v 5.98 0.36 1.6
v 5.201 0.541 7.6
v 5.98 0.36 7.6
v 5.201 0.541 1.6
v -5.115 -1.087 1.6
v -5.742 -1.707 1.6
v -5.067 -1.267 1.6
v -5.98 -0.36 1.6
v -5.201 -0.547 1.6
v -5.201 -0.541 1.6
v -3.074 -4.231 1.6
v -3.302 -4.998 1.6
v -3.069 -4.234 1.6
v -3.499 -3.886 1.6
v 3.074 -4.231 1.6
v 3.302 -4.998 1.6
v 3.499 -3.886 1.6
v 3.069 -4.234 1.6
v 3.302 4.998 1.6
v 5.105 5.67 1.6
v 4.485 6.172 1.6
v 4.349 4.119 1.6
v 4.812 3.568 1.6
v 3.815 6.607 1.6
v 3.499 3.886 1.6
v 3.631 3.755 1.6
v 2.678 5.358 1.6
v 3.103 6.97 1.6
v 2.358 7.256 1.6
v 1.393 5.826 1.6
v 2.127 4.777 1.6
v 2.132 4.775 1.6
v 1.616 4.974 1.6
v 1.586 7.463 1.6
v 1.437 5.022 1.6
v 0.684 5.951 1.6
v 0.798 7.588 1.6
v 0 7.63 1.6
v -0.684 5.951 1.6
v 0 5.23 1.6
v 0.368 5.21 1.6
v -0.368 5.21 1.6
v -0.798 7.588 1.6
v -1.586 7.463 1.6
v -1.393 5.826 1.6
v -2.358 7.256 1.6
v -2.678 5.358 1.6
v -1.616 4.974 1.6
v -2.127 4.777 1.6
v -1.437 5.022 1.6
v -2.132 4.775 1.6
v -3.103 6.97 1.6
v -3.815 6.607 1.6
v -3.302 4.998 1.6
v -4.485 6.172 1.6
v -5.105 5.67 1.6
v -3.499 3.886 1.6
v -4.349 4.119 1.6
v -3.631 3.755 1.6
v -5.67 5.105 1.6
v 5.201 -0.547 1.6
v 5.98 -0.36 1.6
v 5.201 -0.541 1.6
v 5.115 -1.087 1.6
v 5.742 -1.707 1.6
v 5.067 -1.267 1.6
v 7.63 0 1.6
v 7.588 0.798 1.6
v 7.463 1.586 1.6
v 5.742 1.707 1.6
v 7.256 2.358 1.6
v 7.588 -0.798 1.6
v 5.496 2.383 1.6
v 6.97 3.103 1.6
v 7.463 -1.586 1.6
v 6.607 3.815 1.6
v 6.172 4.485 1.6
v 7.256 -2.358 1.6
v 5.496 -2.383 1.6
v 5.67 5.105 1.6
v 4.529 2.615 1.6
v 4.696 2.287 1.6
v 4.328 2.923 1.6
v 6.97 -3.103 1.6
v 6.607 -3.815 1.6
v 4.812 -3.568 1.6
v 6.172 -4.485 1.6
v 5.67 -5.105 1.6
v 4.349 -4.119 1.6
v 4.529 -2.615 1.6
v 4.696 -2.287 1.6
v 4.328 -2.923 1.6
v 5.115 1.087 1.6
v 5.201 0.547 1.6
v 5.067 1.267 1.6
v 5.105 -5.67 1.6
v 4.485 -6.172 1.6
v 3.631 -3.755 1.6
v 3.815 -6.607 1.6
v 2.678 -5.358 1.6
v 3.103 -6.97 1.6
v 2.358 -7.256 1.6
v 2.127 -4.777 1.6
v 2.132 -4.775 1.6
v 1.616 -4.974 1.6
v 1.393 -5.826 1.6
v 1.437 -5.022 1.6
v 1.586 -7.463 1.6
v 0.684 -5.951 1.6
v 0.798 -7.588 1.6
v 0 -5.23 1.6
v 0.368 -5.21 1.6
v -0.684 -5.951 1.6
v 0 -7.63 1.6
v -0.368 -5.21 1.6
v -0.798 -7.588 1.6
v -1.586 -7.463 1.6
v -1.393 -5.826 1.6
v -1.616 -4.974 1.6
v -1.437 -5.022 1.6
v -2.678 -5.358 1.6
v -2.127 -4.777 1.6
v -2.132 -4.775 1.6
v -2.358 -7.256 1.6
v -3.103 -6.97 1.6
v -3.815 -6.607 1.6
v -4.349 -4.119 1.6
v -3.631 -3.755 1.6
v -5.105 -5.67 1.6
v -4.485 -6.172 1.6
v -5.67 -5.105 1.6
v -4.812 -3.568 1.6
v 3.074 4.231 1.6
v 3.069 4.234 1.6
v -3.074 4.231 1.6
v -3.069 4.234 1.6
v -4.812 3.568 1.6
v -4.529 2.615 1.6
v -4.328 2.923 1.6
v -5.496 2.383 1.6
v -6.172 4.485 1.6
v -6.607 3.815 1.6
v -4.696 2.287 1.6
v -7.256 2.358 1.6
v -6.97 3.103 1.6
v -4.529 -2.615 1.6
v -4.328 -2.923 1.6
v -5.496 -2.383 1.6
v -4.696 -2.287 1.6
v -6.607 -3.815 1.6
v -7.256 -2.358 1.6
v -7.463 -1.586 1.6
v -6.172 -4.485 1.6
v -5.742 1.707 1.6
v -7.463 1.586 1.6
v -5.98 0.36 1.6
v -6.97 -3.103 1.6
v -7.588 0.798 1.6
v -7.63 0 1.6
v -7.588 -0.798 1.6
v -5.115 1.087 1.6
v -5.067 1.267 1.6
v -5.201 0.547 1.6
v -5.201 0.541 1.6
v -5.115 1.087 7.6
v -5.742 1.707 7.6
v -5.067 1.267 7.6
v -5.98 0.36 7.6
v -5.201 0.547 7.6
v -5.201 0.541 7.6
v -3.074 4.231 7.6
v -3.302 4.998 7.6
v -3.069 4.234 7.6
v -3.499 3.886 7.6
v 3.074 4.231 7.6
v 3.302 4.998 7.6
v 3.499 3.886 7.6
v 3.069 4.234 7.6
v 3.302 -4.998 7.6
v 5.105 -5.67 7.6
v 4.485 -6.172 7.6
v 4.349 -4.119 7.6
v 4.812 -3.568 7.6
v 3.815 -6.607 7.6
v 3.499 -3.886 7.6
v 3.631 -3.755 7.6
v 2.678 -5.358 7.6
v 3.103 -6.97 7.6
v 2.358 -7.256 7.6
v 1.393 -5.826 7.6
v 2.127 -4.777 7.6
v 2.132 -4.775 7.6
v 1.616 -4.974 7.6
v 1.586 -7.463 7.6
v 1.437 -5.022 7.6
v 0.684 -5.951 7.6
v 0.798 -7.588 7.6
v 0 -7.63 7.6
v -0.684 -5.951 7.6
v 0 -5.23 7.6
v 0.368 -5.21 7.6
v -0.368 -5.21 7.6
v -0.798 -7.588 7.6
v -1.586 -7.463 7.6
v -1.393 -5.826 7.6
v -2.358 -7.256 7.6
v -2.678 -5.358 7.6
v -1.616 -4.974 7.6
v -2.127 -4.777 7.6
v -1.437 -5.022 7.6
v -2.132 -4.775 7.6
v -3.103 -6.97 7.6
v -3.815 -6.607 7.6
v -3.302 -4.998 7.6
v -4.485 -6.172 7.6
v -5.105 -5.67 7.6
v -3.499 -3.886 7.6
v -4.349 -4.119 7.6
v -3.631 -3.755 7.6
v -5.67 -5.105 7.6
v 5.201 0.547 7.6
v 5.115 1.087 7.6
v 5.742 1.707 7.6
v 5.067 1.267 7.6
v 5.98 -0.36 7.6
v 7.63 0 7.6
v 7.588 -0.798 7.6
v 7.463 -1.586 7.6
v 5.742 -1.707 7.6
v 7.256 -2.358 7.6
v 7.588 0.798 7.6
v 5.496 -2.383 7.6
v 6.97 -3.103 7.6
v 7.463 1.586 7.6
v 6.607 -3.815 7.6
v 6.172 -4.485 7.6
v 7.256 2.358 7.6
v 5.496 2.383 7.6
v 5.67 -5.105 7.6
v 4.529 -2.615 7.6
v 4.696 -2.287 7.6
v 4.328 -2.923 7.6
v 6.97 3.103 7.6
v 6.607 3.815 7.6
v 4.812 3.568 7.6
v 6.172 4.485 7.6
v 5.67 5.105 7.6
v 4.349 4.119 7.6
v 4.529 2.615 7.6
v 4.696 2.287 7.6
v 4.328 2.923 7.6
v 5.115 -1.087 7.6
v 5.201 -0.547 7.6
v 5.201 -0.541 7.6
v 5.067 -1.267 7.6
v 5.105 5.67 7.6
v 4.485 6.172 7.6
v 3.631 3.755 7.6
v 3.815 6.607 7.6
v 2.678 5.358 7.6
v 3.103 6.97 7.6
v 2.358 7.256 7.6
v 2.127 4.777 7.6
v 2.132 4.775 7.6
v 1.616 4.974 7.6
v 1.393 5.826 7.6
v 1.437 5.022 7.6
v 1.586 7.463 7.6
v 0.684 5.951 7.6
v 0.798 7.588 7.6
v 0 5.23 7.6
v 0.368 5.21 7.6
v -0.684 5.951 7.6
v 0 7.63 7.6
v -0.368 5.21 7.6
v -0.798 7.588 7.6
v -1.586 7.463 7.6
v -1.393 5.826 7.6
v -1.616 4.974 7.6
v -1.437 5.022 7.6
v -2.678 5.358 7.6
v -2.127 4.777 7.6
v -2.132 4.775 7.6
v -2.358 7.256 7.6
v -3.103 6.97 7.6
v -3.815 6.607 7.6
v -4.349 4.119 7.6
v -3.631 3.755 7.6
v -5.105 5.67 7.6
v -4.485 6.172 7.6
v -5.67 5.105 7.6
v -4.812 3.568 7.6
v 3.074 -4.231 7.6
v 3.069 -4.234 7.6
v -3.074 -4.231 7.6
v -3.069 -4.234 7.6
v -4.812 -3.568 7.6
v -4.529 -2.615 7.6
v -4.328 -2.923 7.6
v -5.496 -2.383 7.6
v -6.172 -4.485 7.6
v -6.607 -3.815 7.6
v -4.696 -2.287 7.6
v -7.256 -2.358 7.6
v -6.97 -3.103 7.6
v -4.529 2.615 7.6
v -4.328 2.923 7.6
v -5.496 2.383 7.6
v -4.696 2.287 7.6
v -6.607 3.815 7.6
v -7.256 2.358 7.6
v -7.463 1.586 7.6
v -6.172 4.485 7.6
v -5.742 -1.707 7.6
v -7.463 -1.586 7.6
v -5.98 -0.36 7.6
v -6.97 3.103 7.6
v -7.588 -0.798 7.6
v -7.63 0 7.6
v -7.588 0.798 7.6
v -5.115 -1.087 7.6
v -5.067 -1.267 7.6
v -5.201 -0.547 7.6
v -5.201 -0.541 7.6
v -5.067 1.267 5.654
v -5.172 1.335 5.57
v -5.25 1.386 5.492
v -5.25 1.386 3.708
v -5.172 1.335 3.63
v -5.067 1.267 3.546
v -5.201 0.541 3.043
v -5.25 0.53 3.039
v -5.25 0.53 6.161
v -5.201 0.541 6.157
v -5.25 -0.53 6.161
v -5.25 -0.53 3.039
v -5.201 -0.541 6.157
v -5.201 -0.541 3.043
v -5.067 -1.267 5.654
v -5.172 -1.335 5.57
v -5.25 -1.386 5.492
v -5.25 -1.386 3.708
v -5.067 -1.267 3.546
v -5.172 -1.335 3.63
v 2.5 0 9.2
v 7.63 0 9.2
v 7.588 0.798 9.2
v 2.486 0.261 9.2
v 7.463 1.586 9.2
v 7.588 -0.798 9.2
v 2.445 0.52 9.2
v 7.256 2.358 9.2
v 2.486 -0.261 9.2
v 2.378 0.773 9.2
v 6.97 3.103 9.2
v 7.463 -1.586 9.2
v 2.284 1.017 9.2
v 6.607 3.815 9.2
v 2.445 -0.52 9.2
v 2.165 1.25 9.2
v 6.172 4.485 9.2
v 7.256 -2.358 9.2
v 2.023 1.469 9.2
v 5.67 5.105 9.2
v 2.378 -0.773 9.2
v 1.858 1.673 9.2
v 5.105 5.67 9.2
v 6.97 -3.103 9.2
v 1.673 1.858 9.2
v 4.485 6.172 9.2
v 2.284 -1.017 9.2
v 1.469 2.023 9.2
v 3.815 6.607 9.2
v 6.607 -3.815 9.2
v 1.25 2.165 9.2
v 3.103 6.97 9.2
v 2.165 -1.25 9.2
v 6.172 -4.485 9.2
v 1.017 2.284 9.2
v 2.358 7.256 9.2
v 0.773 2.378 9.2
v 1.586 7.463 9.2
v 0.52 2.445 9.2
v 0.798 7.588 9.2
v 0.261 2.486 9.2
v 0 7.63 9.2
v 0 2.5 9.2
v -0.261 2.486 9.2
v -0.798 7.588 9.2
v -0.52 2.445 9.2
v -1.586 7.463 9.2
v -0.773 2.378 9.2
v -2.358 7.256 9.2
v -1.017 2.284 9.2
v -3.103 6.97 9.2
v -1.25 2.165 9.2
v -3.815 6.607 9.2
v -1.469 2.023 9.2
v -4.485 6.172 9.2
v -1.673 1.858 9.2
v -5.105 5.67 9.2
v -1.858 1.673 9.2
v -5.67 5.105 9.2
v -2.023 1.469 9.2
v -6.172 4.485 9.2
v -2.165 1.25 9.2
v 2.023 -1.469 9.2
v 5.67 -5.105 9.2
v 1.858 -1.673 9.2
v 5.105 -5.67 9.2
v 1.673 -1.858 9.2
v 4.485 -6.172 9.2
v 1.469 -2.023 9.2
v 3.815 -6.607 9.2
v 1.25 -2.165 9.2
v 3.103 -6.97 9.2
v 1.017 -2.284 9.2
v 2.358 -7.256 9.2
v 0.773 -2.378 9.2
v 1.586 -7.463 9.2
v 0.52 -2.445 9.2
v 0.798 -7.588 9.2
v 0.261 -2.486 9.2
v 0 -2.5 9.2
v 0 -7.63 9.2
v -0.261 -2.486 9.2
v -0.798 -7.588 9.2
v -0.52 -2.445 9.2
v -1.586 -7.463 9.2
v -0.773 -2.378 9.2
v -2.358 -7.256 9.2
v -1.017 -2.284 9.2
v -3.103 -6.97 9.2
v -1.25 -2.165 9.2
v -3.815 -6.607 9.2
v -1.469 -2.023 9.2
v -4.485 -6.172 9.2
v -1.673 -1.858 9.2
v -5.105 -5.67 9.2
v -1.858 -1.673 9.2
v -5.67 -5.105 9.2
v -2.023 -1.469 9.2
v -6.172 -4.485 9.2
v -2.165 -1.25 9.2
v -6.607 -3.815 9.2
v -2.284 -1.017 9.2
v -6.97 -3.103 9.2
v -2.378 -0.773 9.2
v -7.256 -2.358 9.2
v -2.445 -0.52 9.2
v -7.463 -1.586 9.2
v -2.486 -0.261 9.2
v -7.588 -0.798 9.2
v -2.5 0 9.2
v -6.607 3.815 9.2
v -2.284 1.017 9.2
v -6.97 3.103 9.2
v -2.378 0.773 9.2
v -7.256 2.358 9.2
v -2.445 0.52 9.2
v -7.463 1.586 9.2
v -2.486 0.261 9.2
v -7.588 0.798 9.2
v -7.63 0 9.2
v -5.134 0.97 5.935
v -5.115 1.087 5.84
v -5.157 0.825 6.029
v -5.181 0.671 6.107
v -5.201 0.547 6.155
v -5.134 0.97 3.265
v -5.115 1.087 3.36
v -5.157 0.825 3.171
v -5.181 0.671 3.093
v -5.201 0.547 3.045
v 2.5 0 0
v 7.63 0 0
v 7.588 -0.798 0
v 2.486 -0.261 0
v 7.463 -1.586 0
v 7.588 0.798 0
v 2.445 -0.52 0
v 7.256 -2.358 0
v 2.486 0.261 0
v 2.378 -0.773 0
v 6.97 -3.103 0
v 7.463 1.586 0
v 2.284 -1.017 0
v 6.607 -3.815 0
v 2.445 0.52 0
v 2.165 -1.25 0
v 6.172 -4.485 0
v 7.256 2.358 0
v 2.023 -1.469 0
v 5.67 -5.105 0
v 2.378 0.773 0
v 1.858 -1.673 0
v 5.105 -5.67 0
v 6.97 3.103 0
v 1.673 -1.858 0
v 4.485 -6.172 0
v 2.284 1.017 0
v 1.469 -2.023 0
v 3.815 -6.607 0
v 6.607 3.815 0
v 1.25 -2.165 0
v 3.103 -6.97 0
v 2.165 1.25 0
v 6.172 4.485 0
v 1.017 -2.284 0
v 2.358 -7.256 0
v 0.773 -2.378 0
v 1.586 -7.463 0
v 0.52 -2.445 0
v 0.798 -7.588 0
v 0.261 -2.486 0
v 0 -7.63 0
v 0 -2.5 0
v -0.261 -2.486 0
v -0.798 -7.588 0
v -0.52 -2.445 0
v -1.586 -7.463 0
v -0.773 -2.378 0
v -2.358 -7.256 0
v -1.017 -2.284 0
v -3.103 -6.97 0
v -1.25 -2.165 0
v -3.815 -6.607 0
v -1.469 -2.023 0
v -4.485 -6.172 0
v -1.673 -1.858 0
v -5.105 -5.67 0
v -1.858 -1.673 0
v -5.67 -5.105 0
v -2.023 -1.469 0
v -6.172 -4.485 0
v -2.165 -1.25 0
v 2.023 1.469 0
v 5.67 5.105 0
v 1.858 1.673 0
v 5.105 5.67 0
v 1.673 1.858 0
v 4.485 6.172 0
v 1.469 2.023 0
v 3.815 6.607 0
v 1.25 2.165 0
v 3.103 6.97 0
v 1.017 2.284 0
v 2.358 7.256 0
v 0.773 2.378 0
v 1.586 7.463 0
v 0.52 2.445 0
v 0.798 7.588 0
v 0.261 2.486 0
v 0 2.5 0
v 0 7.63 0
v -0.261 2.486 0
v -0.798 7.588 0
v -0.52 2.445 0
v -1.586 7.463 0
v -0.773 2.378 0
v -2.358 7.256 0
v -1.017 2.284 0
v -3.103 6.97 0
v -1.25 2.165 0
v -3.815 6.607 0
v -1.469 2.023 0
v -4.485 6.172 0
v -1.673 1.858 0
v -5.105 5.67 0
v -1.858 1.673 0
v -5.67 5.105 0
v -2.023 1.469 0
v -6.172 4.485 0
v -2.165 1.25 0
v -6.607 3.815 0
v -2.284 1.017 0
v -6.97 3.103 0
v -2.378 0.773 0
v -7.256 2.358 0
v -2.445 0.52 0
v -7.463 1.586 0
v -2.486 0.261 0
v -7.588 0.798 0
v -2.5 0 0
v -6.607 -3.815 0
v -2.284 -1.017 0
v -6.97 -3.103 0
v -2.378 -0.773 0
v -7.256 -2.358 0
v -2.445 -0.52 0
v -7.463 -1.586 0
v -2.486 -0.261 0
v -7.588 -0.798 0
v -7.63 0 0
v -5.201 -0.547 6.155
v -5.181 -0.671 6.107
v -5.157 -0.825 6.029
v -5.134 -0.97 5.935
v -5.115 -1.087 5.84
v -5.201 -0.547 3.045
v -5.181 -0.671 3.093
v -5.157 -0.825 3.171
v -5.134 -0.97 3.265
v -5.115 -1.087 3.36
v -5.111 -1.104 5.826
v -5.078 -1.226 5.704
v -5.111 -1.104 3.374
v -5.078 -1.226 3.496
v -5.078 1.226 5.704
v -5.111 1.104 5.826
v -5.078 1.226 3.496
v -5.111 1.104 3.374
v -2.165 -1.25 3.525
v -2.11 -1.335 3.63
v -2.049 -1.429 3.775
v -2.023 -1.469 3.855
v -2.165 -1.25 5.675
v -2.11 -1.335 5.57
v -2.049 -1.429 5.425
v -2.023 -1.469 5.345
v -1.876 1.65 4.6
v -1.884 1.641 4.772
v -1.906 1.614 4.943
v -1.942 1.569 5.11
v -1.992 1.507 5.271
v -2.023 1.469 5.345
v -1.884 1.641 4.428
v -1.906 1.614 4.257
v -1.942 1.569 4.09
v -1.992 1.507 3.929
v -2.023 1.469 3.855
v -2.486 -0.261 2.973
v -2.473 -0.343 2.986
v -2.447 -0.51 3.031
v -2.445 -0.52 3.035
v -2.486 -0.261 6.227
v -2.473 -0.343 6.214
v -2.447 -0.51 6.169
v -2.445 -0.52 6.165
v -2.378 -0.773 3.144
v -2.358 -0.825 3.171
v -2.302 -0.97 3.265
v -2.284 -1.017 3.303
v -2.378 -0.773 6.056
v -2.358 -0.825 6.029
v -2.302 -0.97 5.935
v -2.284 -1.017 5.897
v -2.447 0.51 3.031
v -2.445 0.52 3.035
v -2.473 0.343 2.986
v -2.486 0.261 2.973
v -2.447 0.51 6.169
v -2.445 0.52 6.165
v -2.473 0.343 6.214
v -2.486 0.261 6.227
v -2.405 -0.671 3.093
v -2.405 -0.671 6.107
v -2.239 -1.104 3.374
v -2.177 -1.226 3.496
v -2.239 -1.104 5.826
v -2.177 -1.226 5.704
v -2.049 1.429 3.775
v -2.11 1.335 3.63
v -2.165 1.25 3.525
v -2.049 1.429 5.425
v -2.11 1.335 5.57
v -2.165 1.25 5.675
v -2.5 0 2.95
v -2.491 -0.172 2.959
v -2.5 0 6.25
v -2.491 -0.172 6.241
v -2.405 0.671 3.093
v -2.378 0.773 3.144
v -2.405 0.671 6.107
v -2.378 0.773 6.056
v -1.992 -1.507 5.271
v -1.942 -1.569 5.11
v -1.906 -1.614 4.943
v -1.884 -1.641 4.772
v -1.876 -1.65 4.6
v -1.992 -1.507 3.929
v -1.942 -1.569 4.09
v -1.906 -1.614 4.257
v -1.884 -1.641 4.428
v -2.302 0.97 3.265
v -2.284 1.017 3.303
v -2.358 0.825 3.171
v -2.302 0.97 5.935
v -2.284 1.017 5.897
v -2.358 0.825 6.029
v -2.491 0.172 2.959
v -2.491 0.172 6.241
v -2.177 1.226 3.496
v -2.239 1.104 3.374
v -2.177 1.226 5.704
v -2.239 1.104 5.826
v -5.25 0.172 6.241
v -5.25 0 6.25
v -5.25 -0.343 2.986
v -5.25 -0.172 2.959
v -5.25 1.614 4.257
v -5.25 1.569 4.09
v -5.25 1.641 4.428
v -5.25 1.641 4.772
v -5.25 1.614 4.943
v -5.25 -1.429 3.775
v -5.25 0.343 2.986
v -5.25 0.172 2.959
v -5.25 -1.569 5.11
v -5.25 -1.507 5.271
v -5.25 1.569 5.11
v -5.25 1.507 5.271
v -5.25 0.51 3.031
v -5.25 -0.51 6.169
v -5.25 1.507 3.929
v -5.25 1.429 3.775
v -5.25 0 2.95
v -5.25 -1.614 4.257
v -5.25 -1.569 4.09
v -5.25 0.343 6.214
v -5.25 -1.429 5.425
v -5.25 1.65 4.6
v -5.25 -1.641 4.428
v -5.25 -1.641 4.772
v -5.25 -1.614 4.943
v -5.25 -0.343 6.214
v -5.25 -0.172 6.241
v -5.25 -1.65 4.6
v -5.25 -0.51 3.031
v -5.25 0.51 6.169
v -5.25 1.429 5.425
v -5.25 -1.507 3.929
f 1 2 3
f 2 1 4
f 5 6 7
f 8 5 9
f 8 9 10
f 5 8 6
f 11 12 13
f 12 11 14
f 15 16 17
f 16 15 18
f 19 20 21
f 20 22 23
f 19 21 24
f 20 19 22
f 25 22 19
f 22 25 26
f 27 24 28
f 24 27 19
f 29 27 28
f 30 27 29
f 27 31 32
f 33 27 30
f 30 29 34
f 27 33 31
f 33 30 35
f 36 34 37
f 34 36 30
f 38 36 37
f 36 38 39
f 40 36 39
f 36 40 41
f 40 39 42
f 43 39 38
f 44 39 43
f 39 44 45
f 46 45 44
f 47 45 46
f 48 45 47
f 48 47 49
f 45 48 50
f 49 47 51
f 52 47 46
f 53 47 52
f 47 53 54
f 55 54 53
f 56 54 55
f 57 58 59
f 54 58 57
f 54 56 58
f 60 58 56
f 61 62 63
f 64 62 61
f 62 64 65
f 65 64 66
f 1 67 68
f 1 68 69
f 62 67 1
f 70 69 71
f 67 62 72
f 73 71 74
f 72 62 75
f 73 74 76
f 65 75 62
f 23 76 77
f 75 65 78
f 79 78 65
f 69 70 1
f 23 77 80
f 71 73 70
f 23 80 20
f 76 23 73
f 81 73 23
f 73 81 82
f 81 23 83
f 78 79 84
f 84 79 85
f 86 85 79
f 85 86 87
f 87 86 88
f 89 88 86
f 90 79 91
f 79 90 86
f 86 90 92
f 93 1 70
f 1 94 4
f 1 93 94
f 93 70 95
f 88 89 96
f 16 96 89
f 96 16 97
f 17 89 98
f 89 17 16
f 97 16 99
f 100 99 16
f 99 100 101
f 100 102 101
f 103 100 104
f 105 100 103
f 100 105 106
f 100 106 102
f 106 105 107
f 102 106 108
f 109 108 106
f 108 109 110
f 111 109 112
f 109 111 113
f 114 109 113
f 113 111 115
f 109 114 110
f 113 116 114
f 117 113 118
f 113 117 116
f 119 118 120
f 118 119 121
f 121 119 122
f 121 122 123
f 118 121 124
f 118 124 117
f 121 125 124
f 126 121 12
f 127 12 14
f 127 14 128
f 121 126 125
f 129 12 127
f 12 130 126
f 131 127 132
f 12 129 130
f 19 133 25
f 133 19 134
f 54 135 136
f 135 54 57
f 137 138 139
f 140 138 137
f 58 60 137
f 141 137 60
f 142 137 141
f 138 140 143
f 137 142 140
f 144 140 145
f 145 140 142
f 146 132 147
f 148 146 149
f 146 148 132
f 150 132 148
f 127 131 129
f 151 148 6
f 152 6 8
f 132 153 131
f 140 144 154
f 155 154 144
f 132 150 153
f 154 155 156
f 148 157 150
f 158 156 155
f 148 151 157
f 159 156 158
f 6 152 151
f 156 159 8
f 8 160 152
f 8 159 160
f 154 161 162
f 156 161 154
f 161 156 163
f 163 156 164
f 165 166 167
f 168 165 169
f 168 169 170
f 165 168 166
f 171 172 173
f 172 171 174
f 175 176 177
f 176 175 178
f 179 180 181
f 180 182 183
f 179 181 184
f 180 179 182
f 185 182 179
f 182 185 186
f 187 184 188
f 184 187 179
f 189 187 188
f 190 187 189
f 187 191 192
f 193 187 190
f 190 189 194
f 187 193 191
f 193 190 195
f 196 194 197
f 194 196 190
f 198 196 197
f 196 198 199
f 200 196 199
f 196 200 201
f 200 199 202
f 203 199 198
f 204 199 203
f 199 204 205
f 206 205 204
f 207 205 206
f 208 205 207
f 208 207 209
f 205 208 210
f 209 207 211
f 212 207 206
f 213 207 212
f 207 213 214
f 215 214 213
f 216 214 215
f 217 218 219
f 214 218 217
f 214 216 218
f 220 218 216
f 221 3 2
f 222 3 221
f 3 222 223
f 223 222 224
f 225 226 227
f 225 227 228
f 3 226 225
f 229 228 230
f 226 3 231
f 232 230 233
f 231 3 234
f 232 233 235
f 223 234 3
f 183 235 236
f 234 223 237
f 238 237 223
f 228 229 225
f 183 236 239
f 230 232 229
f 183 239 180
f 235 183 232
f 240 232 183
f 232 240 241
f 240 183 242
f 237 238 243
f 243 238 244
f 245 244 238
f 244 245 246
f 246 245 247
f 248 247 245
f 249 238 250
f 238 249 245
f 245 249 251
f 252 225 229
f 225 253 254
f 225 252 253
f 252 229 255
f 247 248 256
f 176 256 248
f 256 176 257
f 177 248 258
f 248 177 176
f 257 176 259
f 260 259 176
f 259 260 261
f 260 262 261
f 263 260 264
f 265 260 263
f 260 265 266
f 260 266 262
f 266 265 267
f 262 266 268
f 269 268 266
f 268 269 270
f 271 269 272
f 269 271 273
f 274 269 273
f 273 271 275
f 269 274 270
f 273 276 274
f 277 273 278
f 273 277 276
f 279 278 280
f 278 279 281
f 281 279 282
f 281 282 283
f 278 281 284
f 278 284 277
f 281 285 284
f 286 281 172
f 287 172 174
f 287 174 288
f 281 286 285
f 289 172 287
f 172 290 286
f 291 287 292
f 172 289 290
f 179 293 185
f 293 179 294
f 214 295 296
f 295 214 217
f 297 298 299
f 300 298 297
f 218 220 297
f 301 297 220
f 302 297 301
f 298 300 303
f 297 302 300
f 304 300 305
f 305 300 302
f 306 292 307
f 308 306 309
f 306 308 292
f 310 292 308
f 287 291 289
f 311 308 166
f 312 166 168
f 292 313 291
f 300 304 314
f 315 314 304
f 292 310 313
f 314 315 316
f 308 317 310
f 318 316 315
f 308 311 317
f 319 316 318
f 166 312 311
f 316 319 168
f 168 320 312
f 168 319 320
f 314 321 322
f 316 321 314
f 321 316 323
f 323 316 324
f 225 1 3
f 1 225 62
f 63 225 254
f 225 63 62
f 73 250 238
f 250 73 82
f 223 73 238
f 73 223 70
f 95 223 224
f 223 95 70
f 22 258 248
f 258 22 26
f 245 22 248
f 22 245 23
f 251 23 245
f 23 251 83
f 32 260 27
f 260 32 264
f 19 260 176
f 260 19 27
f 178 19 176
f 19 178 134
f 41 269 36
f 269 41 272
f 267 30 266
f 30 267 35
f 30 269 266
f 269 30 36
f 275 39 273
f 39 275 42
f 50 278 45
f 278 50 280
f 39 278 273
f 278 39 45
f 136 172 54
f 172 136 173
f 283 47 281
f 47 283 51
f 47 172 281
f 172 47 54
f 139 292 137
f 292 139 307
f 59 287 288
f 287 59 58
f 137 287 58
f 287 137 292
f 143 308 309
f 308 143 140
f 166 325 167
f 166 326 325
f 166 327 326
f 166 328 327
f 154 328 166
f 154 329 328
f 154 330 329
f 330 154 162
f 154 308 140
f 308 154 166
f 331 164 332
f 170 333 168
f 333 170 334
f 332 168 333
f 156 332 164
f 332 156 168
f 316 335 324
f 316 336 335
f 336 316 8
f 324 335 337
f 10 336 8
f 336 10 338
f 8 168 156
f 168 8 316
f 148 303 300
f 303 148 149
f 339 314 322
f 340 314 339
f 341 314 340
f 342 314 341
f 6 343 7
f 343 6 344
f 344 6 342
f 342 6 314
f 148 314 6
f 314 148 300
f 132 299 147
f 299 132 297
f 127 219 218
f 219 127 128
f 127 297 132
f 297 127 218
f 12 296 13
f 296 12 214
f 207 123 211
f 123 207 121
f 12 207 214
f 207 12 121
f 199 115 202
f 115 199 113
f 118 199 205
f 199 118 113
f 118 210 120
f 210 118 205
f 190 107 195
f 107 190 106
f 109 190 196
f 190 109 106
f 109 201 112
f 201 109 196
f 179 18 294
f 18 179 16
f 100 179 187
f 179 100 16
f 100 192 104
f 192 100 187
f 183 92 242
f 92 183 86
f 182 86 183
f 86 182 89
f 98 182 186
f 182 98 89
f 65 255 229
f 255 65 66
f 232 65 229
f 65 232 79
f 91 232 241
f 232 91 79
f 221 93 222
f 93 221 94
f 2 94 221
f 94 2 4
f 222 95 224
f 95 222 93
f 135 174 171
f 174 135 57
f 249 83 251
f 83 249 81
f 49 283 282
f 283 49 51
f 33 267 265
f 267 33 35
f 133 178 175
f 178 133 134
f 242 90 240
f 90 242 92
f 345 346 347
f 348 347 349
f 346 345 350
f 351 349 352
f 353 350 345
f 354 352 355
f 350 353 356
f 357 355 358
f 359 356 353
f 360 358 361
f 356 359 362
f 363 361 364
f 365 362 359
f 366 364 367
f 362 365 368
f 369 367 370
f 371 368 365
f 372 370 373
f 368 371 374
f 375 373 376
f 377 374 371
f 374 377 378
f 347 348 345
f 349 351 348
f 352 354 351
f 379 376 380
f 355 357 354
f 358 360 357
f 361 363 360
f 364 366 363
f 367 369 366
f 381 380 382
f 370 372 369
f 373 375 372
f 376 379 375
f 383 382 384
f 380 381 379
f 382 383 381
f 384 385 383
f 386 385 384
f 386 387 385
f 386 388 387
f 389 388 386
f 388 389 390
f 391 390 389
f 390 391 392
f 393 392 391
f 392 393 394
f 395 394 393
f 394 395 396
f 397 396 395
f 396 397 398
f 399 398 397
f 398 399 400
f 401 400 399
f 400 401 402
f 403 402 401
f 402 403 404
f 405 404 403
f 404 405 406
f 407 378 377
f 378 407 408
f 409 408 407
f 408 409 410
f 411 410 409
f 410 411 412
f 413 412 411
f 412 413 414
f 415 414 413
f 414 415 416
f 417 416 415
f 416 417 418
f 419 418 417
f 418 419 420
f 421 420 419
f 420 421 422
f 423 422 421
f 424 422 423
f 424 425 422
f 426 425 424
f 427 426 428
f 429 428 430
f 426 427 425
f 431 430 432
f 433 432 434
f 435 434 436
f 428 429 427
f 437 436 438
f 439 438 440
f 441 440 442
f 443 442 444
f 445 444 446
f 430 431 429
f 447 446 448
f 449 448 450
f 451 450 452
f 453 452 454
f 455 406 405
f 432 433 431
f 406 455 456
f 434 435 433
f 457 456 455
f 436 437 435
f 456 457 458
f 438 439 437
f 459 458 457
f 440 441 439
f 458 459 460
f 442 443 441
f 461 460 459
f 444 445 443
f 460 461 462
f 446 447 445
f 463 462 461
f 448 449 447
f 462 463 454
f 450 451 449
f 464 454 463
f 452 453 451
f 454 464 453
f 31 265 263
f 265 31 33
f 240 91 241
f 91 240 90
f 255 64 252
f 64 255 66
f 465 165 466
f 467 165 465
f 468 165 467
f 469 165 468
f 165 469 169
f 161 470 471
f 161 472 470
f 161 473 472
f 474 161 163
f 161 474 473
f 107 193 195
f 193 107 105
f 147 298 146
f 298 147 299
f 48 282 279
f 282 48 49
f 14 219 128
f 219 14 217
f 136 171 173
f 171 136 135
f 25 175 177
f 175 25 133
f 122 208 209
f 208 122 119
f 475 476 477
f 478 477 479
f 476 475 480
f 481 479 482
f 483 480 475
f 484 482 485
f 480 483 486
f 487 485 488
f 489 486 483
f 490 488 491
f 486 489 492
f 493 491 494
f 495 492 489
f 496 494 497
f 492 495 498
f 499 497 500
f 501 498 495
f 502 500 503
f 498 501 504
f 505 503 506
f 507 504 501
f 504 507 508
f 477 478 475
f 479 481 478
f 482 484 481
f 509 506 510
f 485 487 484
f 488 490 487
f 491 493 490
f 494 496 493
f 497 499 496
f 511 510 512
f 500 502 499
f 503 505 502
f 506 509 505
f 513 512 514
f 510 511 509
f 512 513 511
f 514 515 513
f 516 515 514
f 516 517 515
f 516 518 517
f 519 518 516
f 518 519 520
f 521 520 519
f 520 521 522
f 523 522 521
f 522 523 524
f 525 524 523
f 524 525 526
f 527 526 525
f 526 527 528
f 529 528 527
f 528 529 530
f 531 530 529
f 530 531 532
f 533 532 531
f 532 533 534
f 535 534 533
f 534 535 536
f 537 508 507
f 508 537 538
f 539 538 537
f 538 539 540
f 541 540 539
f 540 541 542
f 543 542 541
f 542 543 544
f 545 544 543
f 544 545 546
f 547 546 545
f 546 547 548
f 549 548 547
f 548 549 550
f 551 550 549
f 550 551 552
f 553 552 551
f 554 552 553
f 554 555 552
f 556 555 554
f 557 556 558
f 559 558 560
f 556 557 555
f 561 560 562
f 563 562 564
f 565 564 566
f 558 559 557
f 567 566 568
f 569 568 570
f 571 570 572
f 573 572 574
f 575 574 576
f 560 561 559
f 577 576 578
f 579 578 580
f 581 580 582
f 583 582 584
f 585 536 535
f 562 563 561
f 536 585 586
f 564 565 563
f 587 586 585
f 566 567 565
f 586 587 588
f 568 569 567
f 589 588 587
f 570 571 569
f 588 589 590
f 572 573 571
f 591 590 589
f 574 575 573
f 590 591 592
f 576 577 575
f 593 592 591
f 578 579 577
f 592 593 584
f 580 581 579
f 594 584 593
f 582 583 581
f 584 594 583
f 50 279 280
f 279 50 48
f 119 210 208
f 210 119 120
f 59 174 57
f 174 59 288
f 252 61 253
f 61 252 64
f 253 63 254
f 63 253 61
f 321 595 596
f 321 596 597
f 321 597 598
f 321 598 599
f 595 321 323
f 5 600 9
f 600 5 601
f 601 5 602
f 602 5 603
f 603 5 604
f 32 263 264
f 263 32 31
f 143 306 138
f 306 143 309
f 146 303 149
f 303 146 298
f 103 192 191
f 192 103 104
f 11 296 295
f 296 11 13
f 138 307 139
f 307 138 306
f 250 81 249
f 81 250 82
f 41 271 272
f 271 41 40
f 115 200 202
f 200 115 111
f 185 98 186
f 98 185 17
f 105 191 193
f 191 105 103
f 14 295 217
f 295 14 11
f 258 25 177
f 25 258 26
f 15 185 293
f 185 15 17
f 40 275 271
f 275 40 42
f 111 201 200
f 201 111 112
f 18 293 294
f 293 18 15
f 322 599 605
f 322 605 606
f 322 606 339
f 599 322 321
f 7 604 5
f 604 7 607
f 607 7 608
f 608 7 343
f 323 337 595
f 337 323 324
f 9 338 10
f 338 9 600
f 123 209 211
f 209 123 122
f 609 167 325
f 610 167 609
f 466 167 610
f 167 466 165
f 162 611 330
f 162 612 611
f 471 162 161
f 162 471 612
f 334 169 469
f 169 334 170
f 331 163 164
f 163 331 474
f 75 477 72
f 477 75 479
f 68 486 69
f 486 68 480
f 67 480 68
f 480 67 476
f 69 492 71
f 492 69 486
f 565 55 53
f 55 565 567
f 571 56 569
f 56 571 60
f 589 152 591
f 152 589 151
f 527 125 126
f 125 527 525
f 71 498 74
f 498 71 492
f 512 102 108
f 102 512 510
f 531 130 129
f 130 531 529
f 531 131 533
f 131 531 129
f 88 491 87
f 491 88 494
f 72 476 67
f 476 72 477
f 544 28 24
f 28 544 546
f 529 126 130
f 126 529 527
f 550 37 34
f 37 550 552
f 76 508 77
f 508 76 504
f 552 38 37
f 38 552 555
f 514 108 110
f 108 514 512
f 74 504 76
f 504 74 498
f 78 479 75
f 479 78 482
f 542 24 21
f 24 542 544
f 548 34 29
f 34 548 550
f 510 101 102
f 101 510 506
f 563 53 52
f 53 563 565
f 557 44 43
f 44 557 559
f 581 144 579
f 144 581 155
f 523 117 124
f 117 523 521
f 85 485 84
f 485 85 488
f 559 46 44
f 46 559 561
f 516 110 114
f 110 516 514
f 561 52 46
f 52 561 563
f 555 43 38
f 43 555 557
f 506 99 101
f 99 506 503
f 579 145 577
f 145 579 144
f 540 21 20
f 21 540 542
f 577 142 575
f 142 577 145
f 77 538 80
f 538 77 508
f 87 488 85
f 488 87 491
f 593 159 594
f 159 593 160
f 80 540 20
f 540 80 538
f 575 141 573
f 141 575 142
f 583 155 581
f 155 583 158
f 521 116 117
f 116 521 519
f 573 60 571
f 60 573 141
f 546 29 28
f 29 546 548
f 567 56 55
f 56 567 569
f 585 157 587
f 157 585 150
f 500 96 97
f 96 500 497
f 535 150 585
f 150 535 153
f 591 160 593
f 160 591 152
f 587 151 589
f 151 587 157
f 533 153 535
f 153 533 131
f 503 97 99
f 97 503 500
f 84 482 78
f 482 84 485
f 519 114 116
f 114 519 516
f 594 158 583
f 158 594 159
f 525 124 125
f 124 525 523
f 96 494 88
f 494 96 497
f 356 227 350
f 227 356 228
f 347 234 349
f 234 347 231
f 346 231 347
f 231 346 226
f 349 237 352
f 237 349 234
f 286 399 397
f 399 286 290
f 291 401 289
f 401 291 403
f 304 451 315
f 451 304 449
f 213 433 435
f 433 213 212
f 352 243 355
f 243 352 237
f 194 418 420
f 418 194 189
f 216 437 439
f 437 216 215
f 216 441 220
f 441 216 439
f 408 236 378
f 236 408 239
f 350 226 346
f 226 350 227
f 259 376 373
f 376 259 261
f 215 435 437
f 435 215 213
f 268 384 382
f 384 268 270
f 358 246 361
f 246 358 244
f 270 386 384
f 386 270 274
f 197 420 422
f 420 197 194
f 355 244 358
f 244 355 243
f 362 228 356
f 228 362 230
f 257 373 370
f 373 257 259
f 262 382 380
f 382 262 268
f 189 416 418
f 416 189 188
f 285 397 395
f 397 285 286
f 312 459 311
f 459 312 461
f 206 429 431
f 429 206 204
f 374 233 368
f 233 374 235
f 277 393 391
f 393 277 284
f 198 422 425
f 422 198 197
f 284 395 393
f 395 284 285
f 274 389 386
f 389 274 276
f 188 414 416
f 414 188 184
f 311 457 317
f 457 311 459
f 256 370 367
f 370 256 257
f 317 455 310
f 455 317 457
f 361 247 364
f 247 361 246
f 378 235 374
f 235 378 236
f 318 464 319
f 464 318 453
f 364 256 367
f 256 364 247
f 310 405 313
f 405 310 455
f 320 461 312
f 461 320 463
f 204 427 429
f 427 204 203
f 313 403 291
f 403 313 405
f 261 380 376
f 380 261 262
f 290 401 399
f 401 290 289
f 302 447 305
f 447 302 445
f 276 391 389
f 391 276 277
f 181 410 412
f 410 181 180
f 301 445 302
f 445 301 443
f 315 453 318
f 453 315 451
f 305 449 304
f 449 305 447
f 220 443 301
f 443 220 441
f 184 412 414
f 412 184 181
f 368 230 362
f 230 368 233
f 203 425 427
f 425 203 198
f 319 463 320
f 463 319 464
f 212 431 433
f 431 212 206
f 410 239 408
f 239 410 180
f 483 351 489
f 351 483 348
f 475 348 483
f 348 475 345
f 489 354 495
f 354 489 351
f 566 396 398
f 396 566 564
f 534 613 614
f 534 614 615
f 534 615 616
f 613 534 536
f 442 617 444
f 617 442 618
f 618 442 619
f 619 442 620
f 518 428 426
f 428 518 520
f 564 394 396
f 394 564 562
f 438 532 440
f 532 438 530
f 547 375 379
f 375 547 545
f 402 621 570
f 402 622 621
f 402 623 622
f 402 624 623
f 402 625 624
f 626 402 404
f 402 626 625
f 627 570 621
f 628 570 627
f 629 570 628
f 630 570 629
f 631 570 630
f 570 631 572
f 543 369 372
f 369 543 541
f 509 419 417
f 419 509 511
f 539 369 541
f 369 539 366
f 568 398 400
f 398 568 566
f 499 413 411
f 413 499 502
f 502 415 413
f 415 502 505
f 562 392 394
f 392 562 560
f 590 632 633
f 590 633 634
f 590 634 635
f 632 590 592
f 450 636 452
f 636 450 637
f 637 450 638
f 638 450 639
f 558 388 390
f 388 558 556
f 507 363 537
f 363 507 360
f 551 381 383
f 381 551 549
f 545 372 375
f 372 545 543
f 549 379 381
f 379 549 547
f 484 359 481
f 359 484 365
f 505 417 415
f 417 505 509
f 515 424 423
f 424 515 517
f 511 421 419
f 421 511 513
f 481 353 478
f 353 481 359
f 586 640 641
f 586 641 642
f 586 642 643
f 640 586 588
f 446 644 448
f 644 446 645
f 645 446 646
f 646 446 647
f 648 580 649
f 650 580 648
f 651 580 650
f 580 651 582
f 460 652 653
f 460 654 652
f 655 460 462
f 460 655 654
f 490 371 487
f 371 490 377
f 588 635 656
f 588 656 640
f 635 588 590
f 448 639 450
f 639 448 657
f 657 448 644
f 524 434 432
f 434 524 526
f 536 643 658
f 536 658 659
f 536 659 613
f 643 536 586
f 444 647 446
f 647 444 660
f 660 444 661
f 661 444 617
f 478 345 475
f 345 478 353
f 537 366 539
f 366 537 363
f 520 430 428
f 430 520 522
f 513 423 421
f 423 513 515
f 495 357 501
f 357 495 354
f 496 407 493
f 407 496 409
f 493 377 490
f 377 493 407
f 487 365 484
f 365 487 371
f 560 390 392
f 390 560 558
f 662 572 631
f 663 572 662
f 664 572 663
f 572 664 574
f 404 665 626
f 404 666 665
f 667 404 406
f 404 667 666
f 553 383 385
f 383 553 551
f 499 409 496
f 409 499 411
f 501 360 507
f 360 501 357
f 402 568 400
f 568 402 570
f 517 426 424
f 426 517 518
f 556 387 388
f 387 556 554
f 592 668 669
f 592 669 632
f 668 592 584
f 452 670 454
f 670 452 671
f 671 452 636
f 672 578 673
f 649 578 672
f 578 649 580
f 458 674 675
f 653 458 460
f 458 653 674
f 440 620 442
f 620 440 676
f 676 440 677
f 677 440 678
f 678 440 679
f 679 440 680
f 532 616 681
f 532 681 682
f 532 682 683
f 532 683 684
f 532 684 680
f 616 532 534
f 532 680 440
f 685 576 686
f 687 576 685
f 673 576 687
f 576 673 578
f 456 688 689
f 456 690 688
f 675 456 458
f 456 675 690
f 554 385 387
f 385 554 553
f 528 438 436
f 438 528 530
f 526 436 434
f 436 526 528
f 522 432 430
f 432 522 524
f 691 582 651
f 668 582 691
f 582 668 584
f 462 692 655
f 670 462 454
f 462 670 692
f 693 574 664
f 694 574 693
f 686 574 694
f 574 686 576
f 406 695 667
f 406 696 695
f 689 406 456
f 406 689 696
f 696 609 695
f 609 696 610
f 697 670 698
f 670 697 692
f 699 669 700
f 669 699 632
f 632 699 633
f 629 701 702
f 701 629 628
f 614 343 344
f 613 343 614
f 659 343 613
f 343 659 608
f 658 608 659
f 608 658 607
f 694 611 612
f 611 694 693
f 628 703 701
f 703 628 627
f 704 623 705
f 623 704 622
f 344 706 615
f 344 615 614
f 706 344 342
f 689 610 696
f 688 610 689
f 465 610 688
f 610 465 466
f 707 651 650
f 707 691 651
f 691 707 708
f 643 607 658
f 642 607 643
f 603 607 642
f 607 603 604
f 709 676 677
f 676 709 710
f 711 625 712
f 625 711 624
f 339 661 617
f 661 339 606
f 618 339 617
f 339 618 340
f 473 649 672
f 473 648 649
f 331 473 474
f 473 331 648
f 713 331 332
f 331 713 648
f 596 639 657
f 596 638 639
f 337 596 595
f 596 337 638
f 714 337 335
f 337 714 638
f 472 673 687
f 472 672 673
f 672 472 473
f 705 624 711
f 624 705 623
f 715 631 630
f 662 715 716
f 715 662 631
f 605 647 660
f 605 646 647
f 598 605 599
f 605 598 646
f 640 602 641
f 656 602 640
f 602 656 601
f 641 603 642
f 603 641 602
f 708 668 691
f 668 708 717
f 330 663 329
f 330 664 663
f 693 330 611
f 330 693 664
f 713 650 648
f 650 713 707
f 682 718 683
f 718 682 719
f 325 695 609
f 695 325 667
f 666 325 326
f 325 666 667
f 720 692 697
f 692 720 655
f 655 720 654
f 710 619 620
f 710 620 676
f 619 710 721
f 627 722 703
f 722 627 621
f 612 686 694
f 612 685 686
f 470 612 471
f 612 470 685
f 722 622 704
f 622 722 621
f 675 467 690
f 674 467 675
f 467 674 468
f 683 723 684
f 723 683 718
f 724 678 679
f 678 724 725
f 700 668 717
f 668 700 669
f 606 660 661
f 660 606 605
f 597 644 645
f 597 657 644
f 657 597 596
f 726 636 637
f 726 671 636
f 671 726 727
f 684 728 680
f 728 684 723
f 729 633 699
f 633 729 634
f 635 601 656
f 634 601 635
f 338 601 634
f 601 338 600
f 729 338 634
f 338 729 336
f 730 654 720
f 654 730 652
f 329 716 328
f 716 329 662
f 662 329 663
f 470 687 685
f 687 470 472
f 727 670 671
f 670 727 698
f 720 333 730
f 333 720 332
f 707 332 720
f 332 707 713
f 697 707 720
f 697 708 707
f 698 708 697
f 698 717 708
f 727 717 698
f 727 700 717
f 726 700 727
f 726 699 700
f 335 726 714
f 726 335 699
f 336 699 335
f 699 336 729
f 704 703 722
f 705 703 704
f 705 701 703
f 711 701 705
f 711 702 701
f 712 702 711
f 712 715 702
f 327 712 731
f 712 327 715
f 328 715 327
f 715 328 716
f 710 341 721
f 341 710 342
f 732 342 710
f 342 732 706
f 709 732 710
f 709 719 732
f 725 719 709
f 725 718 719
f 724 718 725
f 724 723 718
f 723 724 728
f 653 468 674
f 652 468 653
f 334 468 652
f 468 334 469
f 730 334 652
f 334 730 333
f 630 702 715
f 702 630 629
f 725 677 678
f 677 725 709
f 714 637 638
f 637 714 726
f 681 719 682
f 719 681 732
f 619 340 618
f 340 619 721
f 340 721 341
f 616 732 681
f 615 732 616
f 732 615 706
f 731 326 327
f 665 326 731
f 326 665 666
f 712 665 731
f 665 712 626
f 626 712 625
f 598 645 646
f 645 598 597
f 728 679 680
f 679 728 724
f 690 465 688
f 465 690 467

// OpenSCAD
// GT2 pulley, 18 teeth for 6 mm belt.
$fn = 60;
eps = 0.02;
teeth = 18;
belt_pitch = 2;
belt_w = 6;
shaft_d = 5;
set_screw_d = 3.3;
tooth_depth = 0.75;
tooth_overlap = 0.28;
tooth_base_w = 1.2;
tooth_tip_w = 0.72;
flange_t = 1.6;
core_d = teeth * belt_pitch / PI - 1.0;
body_h = belt_w + 2 * flange_t;
module tooth() {
    linear_extrude(height = belt_w)
        polygon(points = [[-tooth_overlap, -tooth_base_w / 2], [tooth_depth, -tooth_tip_w / 2], [tooth_depth, tooth_tip_w / 2], [-tooth_overlap, tooth_base_w / 2]]);
}
difference() {
    union() {
        cylinder(d = core_d, h = body_h);
        cylinder(d = core_d + 4.8, h = flange_t);
        translate([0, 0, body_h - flange_t]) cylinder(d = core_d + 4.8, h = flange_t);
        for (i = [0 : teeth - 1]) rotate([0, 0, i * 360 / teeth]) translate([core_d / 2, 0, flange_t]) tooth();
    }
    translate([0, 0, -eps]) cylinder(d = shaft_d, h = body_h + 2 * eps);
    translate([-core_d / 2 - eps, 0, body_h / 2]) rotate([0, 90, 0]) cylinder(d = set_screw_d, h = core_d / 2 + 2 * eps);
}
